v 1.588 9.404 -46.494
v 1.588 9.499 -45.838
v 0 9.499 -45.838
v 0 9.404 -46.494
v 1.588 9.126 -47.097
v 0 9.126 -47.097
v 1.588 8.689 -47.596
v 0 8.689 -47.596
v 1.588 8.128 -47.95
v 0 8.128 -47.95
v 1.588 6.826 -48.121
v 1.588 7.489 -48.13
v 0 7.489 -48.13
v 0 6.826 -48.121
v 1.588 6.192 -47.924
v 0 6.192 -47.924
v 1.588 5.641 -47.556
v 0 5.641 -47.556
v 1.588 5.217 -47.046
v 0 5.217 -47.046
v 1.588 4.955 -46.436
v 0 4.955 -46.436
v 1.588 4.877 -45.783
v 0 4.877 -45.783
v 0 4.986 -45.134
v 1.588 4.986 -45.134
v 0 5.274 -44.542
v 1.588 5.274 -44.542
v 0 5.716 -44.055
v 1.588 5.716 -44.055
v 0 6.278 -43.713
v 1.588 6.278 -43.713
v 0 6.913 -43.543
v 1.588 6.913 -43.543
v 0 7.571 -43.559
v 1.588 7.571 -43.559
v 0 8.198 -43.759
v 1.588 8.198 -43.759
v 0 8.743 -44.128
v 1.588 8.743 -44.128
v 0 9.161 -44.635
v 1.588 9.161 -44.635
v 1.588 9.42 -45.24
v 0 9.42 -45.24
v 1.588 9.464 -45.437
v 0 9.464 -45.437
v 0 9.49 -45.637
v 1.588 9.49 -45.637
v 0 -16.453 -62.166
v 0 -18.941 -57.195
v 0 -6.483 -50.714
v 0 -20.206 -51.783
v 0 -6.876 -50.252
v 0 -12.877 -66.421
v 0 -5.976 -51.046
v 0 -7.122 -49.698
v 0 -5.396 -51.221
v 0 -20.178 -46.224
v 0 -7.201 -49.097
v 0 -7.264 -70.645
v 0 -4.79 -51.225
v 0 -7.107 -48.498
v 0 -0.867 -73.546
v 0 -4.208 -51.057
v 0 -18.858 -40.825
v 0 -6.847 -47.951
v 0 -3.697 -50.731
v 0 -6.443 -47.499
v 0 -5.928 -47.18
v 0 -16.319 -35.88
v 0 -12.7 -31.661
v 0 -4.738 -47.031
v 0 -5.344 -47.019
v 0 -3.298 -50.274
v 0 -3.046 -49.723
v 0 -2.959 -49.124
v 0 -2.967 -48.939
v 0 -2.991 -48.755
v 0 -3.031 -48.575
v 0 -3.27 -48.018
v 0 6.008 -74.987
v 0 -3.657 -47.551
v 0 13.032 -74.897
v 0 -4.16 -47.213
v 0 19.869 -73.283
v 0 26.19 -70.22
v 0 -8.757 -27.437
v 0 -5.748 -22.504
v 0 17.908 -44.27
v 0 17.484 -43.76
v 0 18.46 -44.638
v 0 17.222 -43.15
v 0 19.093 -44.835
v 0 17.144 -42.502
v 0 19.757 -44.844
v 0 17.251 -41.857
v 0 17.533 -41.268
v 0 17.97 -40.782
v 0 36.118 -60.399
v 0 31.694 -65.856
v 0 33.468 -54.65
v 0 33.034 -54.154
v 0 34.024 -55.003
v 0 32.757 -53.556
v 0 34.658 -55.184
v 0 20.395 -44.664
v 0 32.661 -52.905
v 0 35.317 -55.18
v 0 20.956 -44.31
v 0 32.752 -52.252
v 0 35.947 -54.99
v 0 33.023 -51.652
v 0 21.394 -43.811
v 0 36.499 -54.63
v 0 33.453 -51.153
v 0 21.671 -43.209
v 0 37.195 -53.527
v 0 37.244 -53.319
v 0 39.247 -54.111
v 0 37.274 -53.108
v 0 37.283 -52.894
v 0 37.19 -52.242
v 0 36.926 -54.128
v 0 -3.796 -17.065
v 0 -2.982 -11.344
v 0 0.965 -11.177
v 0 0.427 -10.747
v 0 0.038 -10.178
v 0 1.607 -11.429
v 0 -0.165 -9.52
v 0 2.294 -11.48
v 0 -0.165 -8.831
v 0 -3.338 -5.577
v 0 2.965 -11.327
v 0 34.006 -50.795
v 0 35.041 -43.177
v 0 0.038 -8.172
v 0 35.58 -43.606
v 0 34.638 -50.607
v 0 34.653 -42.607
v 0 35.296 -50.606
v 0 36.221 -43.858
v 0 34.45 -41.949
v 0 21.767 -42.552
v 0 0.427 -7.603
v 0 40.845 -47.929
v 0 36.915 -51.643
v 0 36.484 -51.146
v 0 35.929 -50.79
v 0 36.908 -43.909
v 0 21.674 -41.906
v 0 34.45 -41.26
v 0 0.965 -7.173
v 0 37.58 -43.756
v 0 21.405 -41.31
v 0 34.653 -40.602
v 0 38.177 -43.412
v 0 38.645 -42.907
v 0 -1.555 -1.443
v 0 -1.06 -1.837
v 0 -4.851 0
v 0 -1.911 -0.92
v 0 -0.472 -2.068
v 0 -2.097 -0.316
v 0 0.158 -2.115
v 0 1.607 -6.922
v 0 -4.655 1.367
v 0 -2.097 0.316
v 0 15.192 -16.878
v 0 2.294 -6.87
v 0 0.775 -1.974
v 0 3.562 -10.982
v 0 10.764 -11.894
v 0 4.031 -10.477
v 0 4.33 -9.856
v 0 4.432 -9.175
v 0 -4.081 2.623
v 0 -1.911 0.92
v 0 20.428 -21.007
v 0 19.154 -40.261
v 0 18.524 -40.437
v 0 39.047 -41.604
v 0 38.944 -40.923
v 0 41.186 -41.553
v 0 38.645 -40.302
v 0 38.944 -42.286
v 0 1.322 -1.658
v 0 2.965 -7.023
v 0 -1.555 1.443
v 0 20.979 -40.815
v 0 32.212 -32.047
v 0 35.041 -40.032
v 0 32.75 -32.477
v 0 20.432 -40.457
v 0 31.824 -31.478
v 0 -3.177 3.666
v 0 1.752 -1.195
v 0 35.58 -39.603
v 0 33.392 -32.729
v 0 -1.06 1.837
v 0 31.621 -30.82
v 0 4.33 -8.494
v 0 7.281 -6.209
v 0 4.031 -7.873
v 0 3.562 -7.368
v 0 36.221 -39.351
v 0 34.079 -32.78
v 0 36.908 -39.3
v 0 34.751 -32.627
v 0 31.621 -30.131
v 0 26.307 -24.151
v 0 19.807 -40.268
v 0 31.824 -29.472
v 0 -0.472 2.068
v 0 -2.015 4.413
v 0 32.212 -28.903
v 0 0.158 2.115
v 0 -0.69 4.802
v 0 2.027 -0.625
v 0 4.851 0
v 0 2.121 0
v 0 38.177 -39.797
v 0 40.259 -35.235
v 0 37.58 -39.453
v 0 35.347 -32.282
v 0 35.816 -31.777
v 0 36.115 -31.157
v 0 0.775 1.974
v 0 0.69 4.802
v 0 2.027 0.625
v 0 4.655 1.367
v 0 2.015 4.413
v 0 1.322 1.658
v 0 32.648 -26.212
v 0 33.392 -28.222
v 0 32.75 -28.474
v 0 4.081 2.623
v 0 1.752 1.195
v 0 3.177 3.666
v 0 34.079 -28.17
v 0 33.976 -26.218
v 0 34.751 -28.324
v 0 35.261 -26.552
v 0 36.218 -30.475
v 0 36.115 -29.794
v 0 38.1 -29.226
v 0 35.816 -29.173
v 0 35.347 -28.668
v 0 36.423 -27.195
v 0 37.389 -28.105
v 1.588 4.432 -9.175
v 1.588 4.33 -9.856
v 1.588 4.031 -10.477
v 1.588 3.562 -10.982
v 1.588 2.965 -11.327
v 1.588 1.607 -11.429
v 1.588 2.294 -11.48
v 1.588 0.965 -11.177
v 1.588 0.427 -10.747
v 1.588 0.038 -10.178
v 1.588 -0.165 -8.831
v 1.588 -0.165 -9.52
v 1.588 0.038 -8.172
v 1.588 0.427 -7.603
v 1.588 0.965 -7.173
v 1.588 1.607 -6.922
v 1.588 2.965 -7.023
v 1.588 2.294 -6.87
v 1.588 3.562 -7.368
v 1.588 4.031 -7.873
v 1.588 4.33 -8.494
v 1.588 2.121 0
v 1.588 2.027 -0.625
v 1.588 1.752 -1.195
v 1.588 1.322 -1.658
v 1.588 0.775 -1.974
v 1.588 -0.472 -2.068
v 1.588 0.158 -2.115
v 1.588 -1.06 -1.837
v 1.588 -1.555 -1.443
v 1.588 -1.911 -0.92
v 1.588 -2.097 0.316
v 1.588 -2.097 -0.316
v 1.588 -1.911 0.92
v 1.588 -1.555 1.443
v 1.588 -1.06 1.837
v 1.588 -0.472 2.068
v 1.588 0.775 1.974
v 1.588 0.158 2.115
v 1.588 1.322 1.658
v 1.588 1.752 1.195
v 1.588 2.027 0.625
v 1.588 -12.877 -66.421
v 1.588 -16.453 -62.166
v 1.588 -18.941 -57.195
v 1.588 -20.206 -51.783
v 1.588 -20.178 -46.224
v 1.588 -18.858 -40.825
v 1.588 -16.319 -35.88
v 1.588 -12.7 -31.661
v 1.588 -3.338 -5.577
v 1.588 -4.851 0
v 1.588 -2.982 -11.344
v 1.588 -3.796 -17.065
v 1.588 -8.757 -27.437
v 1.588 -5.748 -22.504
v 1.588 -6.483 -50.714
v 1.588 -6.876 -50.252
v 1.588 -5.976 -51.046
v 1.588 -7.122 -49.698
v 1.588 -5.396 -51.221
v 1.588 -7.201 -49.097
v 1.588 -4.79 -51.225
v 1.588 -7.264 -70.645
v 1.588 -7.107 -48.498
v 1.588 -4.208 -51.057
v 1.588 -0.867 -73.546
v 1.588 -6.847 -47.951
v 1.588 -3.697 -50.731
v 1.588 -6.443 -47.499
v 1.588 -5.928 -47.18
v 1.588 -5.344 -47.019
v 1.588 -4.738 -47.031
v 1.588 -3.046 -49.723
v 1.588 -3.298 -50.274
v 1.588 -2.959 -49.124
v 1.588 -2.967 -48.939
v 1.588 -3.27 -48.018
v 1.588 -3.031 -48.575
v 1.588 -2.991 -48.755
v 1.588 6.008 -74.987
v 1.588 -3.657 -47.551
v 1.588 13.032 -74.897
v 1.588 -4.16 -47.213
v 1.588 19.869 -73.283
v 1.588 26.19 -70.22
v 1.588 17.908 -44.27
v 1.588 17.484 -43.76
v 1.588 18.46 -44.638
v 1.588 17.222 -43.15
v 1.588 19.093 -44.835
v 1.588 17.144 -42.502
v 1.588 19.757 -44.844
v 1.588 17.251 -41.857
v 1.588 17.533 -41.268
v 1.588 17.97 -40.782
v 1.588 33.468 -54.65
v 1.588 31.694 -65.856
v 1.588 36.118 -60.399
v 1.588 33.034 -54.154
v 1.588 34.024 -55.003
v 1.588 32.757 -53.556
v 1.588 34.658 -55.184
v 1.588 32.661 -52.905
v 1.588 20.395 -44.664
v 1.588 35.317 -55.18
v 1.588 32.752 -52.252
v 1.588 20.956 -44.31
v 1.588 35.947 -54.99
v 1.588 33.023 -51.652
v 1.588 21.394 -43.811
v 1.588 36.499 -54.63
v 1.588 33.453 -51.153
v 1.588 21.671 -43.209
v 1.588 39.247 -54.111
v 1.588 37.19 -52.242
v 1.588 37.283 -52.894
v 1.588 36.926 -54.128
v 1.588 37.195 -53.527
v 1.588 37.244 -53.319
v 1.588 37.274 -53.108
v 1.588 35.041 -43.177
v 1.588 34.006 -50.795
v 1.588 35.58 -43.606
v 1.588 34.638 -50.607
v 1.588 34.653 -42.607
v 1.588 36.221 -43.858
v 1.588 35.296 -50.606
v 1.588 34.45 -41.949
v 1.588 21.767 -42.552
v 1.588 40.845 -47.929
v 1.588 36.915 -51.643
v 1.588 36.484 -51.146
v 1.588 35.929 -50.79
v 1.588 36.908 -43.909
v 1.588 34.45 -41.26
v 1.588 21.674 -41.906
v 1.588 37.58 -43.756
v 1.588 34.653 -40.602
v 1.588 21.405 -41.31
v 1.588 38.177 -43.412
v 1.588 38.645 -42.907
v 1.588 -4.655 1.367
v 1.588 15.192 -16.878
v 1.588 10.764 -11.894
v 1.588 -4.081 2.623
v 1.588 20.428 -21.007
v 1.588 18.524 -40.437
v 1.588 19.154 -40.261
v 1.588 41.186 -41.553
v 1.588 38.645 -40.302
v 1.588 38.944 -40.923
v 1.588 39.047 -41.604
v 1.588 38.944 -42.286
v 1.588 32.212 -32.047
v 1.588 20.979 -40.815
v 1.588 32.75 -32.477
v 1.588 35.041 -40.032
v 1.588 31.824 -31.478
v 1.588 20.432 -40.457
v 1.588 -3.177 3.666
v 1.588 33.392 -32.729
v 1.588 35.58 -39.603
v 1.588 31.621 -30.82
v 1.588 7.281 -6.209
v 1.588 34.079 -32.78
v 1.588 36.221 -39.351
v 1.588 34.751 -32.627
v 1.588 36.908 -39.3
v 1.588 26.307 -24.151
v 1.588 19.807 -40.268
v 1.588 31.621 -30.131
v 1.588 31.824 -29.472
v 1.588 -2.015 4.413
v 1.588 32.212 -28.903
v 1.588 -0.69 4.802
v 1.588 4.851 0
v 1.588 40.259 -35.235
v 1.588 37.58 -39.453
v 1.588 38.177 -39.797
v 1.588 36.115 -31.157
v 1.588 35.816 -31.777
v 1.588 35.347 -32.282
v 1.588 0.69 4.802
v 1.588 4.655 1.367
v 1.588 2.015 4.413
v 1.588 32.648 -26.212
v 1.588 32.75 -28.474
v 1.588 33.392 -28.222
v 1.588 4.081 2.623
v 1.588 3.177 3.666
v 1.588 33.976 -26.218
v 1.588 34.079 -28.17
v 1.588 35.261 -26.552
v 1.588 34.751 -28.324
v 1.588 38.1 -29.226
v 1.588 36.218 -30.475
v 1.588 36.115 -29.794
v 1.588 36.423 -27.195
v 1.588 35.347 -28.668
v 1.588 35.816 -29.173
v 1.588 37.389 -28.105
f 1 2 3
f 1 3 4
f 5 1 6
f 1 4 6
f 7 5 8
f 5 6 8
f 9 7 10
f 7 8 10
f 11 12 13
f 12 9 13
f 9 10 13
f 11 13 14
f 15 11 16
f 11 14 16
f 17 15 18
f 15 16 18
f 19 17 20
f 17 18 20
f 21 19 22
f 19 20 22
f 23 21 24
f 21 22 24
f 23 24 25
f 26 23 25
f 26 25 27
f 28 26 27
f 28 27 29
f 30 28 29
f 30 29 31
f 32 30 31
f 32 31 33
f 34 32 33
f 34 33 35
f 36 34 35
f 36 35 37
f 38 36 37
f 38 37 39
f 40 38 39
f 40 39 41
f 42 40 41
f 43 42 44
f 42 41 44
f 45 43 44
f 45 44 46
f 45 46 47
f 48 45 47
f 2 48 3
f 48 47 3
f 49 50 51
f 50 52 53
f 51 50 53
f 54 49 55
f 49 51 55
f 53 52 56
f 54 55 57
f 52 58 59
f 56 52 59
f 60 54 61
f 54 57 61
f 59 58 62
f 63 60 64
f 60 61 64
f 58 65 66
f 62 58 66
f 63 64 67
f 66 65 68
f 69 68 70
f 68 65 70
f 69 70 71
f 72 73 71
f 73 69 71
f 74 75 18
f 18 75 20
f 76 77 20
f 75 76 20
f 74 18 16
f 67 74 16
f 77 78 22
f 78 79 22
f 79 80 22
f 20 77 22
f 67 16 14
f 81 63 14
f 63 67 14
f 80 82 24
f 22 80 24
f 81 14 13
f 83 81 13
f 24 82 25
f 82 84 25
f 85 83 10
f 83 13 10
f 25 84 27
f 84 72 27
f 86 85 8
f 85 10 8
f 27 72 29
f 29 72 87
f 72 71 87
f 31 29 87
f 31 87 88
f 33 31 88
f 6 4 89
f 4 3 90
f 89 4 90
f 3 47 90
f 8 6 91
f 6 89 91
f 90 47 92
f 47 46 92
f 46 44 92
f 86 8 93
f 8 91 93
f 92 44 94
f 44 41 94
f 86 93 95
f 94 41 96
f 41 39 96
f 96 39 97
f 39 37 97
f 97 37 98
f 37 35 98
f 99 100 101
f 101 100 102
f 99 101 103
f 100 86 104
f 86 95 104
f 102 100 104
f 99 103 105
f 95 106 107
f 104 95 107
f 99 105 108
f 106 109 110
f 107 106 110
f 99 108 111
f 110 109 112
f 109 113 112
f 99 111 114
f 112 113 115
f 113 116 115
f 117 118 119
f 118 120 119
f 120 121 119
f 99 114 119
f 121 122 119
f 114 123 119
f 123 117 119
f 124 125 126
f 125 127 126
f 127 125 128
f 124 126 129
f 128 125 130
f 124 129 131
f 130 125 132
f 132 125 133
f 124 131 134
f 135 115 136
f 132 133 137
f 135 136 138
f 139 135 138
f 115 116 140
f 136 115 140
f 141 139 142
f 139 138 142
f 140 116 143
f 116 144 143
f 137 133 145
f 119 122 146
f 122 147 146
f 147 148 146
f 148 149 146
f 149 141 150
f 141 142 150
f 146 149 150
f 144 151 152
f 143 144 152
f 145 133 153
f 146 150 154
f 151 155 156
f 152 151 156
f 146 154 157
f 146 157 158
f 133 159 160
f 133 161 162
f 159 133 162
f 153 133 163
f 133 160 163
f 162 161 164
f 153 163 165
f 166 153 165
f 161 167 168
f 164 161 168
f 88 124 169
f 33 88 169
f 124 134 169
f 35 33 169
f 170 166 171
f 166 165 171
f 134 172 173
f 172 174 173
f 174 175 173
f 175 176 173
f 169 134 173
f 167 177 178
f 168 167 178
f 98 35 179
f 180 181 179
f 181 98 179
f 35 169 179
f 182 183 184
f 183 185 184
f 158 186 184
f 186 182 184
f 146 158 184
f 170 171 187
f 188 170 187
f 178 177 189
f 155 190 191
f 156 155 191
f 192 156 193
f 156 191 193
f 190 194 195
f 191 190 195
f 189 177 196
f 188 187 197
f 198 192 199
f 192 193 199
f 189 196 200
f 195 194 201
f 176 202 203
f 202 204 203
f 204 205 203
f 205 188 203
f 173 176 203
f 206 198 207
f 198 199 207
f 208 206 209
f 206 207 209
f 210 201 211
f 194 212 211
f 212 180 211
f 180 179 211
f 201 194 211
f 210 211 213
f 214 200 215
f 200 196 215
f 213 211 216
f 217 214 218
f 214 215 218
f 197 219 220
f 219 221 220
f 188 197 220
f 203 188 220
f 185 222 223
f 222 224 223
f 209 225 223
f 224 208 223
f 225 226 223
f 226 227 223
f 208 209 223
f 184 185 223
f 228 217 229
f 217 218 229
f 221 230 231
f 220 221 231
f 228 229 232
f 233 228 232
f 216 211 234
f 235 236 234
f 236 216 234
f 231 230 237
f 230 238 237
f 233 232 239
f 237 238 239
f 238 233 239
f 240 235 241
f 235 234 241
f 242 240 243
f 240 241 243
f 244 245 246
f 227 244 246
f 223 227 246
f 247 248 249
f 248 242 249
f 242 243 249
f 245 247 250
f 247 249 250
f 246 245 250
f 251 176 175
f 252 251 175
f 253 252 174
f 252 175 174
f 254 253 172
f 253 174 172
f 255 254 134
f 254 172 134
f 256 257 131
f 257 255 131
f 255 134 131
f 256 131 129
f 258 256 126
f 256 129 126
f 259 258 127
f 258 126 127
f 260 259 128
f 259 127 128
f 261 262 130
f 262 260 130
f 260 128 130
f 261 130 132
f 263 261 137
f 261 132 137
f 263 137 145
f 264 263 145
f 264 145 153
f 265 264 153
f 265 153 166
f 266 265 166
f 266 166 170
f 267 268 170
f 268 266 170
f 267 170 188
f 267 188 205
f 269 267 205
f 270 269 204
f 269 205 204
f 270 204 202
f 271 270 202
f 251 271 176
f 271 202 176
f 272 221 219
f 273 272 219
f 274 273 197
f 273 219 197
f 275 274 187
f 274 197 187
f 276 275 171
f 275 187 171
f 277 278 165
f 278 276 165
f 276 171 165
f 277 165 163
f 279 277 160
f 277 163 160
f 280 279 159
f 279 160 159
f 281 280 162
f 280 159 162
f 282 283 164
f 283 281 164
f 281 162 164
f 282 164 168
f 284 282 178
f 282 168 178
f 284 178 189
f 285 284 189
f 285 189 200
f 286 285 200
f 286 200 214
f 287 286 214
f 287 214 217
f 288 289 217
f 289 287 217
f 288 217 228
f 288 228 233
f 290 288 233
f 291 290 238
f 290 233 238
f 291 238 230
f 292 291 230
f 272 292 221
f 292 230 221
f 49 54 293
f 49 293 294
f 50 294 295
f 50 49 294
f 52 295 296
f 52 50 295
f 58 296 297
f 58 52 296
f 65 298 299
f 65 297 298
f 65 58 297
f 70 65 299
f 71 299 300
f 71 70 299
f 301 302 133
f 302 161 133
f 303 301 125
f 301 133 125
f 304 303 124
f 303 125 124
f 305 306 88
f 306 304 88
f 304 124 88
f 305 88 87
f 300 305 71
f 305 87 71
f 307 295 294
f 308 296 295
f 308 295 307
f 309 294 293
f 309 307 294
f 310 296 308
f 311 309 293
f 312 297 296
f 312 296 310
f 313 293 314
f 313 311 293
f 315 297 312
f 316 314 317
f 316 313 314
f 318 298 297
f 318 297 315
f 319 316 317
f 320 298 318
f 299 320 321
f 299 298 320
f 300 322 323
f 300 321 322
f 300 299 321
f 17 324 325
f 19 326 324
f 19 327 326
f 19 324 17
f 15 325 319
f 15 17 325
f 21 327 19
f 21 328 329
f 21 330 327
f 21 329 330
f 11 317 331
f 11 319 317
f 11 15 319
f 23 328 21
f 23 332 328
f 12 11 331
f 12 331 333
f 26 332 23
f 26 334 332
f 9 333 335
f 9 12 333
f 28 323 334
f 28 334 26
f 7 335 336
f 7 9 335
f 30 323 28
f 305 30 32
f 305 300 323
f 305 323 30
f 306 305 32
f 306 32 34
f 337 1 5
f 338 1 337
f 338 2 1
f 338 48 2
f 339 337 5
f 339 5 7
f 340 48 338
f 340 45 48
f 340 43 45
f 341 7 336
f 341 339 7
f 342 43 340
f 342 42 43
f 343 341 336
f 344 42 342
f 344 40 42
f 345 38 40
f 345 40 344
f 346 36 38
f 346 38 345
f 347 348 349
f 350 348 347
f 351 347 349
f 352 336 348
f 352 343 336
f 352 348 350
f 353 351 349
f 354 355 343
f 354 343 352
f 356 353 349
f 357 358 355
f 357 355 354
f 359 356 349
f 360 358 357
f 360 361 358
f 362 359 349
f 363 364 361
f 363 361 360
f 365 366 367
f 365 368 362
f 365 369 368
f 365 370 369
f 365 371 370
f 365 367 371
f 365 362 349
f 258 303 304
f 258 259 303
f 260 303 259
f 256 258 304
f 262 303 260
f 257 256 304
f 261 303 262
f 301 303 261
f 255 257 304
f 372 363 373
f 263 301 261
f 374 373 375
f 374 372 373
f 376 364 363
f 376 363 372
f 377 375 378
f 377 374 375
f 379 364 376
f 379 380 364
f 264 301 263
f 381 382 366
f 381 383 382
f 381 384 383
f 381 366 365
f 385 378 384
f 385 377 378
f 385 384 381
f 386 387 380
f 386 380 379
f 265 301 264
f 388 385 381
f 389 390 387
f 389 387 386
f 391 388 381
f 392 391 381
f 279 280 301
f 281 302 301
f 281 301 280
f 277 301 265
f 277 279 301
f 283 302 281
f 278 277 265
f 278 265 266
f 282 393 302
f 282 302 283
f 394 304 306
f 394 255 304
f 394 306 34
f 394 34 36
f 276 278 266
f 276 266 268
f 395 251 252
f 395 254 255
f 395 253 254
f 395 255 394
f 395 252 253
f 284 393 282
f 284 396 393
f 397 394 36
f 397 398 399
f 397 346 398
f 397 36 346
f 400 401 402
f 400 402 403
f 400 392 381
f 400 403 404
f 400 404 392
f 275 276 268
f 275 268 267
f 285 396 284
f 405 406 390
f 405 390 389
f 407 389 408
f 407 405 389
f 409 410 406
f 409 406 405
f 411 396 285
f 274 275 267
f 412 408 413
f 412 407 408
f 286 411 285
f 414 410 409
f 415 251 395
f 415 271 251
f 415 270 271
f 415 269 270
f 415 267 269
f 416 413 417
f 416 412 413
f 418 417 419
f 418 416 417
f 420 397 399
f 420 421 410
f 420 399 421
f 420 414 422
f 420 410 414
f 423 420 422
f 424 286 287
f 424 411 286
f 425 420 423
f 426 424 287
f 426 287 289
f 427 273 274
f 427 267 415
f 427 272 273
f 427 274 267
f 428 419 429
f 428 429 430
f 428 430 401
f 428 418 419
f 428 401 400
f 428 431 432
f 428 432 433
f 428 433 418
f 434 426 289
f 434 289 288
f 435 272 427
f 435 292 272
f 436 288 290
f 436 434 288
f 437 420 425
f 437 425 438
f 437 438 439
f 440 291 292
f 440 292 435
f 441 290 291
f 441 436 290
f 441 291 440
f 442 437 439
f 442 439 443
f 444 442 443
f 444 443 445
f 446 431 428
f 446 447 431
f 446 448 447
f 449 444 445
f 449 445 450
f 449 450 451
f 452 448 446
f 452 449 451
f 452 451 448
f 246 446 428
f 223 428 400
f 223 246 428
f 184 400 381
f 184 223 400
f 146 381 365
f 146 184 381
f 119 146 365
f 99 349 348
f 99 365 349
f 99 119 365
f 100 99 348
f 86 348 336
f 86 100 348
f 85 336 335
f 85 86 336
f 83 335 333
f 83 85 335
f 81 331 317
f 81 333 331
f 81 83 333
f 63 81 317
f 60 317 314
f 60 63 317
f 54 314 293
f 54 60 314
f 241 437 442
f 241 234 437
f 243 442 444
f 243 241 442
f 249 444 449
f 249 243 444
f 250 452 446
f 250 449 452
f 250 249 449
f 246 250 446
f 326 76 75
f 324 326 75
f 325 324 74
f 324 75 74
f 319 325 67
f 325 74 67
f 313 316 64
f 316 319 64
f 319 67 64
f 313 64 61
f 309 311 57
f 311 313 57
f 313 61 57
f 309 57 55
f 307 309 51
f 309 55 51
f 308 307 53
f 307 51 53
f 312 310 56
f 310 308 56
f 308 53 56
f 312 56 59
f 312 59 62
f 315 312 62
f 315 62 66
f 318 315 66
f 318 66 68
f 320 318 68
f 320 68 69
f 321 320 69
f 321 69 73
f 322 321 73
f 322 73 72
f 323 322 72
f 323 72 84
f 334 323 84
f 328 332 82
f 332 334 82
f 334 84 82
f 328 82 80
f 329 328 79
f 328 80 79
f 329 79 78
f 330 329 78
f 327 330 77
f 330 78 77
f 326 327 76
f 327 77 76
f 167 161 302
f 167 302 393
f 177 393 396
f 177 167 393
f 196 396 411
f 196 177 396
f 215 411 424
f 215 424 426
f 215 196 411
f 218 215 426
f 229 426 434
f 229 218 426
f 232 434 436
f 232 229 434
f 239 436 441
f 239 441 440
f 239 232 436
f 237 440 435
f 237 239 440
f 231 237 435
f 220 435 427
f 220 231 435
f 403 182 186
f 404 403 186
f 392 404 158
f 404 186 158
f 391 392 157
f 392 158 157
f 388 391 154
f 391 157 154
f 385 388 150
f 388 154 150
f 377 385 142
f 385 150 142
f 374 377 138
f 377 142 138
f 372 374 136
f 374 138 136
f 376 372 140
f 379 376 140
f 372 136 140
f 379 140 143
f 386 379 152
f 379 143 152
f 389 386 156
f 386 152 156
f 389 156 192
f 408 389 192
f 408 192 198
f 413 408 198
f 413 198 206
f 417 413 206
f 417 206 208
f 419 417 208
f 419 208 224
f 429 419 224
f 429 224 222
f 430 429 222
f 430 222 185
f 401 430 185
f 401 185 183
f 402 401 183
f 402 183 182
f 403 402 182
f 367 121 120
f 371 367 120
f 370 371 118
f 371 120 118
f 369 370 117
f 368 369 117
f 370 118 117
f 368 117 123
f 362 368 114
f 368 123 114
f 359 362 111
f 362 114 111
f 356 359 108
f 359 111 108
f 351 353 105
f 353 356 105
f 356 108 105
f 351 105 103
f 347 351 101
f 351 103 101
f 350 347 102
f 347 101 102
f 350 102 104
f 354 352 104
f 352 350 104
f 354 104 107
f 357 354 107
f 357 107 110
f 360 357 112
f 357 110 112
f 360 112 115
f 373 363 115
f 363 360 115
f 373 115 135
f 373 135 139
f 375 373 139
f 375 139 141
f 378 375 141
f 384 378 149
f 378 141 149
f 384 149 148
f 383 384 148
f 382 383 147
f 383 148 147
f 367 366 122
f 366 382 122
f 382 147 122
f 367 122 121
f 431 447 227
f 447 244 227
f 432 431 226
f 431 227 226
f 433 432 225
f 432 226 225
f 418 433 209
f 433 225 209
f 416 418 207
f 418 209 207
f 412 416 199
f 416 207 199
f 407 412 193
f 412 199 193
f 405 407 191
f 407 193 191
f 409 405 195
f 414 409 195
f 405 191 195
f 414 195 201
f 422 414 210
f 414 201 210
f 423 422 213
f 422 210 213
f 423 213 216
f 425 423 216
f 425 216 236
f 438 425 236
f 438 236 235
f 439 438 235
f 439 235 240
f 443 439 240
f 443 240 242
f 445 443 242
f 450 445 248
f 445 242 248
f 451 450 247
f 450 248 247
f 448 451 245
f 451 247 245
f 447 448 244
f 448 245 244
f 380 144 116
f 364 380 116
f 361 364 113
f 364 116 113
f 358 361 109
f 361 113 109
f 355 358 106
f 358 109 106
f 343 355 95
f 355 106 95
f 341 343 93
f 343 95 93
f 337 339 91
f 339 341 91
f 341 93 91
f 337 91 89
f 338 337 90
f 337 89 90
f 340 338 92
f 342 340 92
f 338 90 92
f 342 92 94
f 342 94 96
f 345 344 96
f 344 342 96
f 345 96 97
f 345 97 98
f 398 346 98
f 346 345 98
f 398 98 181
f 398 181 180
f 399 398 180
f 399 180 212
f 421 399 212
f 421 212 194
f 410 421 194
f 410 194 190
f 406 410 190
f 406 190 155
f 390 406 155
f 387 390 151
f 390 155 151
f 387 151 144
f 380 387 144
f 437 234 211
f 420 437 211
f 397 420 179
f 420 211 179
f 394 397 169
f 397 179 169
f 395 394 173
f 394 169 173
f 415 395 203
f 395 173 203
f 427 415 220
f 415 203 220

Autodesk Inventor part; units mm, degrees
ref_plane "YZ Plane" through (0, 0, 0) normal (1, 0, 0) x (0, 1, 0)
ref_plane "XZ Plane" through (0, 0, 0) normal (0, 1, 0) x (-1, 0, 0)
ref_plane "XY Plane" through (0, 0, 0) normal (0, 0, 1) x (1, 0, 0)
sketch "Sketch4" plane through (0, 0, 0) normal (1, 0, 0) x (0, 1, 0)
  line L0 (-0.177, -66.4213) -> (-12.877, -66.4213)
  line L1 (0, -49.1236) -> (-5.08, -49.1236)
  circle A0 centre (-5.08, -49.1236) radius 2.1209
  line L2 (-5.08, -49.1236) -> (7.1876, -45.838)
  arc A1 (-12.7, -31.6611) -> (-12.877, -66.4213) centre (3.3882, -49.1236) ccw
  circle A2 centre (7.1876, -45.838) radius 2.3114
  arc A3 (-12.877, -66.4213) -> (38.1002, -29.2262) centre (9.1157, -43.0325) ccw
  circle A4 centre (19.4552, -42.5523) radius 2.3114
  line L3 (7.1876, -45.838) -> (19.4552, -42.5523)
  line L4 (38.1695, -29.2174) -> (33.9062, -30.4753)
  circle A5 centre (34.972, -52.8945) radius 2.3114
  circle A6 centre (36.7356, -41.6045) radius 2.3114
  arc A7 (39.2694, -49.6585) -> (39.5231, -48.5235) centre (33.2252, -47.7117) ccw
  line L5 (39.2474, -54.1108) -> (34.972, -52.8945)
  line L6 (41.1789, -41.481) -> (36.7356, -41.6045)
  circle A8 centre (33.9062, -30.4753) radius 2.3114
  arc A9 (38.1002, -29.2262) -> (32.6481, -26.212) centre (33.2894, -31.4901) ccw
  line L7 (33.9062, -30.4753) -> (32.6481, -26.212)
  arc A10 (-12.7, -31.6611) -> (-4.8514, 0) centre (-31.4487, -10.21) ccw
  line L8 (2.3114, 0) -> (4.8514, 0)
  arc A11 (4.8514, 0) -> (0, 4.8514) centre (0, 0) ccw
  arc A12 (0, 4.8514) -> (-4.8514, 0) centre (0, 0) ccw
  arc A13 (4.8514, 0) -> (32.6481, -26.212) centre (41.1134, 10.6096) ccw
  circle A14 centre (0, 0) radius 2.1209
  circle A15 centre (2.1209, -9.1751) radius 2.3114
  point P0 (38.105, -29.2364)
  point P1 (36.1231, -29.8211)
  point P2 (33.2519, -28.2584)
  dimension "d110" = 2.54
  dimension "d111" = 4.8514
  dimension "d112" = 5.08
  dimension "d113" = 12.7
  dimension "d114" = 6.35
  dimension "d115" = 4.445
  dimension "d116" = 4.6228
  dimension "d117" = 4.2418
  dimension "d118" = 4.445
  dimension "d119" = 12.7
  dimension "d120" = 12.7
  dimension "d121" = 4.6228
  dimension "d122" = 4.6228
  dimension "d123" = 4.445
  dimension "d124" = 4.6228
  dimension "d125" = 4.445
  dimension "d126" = 4.6228
  dimension "d127" = 4.2418
  dimension "d128" = 4.6228
extrude "Extrusion4" add sketch "Sketch4" along normal blind 1.5875 contours A10 A12 A11 A13 L7 A8 L4 A3 A1 | L4 A8 L7 A9 A3
properties part number "Odom Pod Poly" material "Polycarbonate, Clear"
